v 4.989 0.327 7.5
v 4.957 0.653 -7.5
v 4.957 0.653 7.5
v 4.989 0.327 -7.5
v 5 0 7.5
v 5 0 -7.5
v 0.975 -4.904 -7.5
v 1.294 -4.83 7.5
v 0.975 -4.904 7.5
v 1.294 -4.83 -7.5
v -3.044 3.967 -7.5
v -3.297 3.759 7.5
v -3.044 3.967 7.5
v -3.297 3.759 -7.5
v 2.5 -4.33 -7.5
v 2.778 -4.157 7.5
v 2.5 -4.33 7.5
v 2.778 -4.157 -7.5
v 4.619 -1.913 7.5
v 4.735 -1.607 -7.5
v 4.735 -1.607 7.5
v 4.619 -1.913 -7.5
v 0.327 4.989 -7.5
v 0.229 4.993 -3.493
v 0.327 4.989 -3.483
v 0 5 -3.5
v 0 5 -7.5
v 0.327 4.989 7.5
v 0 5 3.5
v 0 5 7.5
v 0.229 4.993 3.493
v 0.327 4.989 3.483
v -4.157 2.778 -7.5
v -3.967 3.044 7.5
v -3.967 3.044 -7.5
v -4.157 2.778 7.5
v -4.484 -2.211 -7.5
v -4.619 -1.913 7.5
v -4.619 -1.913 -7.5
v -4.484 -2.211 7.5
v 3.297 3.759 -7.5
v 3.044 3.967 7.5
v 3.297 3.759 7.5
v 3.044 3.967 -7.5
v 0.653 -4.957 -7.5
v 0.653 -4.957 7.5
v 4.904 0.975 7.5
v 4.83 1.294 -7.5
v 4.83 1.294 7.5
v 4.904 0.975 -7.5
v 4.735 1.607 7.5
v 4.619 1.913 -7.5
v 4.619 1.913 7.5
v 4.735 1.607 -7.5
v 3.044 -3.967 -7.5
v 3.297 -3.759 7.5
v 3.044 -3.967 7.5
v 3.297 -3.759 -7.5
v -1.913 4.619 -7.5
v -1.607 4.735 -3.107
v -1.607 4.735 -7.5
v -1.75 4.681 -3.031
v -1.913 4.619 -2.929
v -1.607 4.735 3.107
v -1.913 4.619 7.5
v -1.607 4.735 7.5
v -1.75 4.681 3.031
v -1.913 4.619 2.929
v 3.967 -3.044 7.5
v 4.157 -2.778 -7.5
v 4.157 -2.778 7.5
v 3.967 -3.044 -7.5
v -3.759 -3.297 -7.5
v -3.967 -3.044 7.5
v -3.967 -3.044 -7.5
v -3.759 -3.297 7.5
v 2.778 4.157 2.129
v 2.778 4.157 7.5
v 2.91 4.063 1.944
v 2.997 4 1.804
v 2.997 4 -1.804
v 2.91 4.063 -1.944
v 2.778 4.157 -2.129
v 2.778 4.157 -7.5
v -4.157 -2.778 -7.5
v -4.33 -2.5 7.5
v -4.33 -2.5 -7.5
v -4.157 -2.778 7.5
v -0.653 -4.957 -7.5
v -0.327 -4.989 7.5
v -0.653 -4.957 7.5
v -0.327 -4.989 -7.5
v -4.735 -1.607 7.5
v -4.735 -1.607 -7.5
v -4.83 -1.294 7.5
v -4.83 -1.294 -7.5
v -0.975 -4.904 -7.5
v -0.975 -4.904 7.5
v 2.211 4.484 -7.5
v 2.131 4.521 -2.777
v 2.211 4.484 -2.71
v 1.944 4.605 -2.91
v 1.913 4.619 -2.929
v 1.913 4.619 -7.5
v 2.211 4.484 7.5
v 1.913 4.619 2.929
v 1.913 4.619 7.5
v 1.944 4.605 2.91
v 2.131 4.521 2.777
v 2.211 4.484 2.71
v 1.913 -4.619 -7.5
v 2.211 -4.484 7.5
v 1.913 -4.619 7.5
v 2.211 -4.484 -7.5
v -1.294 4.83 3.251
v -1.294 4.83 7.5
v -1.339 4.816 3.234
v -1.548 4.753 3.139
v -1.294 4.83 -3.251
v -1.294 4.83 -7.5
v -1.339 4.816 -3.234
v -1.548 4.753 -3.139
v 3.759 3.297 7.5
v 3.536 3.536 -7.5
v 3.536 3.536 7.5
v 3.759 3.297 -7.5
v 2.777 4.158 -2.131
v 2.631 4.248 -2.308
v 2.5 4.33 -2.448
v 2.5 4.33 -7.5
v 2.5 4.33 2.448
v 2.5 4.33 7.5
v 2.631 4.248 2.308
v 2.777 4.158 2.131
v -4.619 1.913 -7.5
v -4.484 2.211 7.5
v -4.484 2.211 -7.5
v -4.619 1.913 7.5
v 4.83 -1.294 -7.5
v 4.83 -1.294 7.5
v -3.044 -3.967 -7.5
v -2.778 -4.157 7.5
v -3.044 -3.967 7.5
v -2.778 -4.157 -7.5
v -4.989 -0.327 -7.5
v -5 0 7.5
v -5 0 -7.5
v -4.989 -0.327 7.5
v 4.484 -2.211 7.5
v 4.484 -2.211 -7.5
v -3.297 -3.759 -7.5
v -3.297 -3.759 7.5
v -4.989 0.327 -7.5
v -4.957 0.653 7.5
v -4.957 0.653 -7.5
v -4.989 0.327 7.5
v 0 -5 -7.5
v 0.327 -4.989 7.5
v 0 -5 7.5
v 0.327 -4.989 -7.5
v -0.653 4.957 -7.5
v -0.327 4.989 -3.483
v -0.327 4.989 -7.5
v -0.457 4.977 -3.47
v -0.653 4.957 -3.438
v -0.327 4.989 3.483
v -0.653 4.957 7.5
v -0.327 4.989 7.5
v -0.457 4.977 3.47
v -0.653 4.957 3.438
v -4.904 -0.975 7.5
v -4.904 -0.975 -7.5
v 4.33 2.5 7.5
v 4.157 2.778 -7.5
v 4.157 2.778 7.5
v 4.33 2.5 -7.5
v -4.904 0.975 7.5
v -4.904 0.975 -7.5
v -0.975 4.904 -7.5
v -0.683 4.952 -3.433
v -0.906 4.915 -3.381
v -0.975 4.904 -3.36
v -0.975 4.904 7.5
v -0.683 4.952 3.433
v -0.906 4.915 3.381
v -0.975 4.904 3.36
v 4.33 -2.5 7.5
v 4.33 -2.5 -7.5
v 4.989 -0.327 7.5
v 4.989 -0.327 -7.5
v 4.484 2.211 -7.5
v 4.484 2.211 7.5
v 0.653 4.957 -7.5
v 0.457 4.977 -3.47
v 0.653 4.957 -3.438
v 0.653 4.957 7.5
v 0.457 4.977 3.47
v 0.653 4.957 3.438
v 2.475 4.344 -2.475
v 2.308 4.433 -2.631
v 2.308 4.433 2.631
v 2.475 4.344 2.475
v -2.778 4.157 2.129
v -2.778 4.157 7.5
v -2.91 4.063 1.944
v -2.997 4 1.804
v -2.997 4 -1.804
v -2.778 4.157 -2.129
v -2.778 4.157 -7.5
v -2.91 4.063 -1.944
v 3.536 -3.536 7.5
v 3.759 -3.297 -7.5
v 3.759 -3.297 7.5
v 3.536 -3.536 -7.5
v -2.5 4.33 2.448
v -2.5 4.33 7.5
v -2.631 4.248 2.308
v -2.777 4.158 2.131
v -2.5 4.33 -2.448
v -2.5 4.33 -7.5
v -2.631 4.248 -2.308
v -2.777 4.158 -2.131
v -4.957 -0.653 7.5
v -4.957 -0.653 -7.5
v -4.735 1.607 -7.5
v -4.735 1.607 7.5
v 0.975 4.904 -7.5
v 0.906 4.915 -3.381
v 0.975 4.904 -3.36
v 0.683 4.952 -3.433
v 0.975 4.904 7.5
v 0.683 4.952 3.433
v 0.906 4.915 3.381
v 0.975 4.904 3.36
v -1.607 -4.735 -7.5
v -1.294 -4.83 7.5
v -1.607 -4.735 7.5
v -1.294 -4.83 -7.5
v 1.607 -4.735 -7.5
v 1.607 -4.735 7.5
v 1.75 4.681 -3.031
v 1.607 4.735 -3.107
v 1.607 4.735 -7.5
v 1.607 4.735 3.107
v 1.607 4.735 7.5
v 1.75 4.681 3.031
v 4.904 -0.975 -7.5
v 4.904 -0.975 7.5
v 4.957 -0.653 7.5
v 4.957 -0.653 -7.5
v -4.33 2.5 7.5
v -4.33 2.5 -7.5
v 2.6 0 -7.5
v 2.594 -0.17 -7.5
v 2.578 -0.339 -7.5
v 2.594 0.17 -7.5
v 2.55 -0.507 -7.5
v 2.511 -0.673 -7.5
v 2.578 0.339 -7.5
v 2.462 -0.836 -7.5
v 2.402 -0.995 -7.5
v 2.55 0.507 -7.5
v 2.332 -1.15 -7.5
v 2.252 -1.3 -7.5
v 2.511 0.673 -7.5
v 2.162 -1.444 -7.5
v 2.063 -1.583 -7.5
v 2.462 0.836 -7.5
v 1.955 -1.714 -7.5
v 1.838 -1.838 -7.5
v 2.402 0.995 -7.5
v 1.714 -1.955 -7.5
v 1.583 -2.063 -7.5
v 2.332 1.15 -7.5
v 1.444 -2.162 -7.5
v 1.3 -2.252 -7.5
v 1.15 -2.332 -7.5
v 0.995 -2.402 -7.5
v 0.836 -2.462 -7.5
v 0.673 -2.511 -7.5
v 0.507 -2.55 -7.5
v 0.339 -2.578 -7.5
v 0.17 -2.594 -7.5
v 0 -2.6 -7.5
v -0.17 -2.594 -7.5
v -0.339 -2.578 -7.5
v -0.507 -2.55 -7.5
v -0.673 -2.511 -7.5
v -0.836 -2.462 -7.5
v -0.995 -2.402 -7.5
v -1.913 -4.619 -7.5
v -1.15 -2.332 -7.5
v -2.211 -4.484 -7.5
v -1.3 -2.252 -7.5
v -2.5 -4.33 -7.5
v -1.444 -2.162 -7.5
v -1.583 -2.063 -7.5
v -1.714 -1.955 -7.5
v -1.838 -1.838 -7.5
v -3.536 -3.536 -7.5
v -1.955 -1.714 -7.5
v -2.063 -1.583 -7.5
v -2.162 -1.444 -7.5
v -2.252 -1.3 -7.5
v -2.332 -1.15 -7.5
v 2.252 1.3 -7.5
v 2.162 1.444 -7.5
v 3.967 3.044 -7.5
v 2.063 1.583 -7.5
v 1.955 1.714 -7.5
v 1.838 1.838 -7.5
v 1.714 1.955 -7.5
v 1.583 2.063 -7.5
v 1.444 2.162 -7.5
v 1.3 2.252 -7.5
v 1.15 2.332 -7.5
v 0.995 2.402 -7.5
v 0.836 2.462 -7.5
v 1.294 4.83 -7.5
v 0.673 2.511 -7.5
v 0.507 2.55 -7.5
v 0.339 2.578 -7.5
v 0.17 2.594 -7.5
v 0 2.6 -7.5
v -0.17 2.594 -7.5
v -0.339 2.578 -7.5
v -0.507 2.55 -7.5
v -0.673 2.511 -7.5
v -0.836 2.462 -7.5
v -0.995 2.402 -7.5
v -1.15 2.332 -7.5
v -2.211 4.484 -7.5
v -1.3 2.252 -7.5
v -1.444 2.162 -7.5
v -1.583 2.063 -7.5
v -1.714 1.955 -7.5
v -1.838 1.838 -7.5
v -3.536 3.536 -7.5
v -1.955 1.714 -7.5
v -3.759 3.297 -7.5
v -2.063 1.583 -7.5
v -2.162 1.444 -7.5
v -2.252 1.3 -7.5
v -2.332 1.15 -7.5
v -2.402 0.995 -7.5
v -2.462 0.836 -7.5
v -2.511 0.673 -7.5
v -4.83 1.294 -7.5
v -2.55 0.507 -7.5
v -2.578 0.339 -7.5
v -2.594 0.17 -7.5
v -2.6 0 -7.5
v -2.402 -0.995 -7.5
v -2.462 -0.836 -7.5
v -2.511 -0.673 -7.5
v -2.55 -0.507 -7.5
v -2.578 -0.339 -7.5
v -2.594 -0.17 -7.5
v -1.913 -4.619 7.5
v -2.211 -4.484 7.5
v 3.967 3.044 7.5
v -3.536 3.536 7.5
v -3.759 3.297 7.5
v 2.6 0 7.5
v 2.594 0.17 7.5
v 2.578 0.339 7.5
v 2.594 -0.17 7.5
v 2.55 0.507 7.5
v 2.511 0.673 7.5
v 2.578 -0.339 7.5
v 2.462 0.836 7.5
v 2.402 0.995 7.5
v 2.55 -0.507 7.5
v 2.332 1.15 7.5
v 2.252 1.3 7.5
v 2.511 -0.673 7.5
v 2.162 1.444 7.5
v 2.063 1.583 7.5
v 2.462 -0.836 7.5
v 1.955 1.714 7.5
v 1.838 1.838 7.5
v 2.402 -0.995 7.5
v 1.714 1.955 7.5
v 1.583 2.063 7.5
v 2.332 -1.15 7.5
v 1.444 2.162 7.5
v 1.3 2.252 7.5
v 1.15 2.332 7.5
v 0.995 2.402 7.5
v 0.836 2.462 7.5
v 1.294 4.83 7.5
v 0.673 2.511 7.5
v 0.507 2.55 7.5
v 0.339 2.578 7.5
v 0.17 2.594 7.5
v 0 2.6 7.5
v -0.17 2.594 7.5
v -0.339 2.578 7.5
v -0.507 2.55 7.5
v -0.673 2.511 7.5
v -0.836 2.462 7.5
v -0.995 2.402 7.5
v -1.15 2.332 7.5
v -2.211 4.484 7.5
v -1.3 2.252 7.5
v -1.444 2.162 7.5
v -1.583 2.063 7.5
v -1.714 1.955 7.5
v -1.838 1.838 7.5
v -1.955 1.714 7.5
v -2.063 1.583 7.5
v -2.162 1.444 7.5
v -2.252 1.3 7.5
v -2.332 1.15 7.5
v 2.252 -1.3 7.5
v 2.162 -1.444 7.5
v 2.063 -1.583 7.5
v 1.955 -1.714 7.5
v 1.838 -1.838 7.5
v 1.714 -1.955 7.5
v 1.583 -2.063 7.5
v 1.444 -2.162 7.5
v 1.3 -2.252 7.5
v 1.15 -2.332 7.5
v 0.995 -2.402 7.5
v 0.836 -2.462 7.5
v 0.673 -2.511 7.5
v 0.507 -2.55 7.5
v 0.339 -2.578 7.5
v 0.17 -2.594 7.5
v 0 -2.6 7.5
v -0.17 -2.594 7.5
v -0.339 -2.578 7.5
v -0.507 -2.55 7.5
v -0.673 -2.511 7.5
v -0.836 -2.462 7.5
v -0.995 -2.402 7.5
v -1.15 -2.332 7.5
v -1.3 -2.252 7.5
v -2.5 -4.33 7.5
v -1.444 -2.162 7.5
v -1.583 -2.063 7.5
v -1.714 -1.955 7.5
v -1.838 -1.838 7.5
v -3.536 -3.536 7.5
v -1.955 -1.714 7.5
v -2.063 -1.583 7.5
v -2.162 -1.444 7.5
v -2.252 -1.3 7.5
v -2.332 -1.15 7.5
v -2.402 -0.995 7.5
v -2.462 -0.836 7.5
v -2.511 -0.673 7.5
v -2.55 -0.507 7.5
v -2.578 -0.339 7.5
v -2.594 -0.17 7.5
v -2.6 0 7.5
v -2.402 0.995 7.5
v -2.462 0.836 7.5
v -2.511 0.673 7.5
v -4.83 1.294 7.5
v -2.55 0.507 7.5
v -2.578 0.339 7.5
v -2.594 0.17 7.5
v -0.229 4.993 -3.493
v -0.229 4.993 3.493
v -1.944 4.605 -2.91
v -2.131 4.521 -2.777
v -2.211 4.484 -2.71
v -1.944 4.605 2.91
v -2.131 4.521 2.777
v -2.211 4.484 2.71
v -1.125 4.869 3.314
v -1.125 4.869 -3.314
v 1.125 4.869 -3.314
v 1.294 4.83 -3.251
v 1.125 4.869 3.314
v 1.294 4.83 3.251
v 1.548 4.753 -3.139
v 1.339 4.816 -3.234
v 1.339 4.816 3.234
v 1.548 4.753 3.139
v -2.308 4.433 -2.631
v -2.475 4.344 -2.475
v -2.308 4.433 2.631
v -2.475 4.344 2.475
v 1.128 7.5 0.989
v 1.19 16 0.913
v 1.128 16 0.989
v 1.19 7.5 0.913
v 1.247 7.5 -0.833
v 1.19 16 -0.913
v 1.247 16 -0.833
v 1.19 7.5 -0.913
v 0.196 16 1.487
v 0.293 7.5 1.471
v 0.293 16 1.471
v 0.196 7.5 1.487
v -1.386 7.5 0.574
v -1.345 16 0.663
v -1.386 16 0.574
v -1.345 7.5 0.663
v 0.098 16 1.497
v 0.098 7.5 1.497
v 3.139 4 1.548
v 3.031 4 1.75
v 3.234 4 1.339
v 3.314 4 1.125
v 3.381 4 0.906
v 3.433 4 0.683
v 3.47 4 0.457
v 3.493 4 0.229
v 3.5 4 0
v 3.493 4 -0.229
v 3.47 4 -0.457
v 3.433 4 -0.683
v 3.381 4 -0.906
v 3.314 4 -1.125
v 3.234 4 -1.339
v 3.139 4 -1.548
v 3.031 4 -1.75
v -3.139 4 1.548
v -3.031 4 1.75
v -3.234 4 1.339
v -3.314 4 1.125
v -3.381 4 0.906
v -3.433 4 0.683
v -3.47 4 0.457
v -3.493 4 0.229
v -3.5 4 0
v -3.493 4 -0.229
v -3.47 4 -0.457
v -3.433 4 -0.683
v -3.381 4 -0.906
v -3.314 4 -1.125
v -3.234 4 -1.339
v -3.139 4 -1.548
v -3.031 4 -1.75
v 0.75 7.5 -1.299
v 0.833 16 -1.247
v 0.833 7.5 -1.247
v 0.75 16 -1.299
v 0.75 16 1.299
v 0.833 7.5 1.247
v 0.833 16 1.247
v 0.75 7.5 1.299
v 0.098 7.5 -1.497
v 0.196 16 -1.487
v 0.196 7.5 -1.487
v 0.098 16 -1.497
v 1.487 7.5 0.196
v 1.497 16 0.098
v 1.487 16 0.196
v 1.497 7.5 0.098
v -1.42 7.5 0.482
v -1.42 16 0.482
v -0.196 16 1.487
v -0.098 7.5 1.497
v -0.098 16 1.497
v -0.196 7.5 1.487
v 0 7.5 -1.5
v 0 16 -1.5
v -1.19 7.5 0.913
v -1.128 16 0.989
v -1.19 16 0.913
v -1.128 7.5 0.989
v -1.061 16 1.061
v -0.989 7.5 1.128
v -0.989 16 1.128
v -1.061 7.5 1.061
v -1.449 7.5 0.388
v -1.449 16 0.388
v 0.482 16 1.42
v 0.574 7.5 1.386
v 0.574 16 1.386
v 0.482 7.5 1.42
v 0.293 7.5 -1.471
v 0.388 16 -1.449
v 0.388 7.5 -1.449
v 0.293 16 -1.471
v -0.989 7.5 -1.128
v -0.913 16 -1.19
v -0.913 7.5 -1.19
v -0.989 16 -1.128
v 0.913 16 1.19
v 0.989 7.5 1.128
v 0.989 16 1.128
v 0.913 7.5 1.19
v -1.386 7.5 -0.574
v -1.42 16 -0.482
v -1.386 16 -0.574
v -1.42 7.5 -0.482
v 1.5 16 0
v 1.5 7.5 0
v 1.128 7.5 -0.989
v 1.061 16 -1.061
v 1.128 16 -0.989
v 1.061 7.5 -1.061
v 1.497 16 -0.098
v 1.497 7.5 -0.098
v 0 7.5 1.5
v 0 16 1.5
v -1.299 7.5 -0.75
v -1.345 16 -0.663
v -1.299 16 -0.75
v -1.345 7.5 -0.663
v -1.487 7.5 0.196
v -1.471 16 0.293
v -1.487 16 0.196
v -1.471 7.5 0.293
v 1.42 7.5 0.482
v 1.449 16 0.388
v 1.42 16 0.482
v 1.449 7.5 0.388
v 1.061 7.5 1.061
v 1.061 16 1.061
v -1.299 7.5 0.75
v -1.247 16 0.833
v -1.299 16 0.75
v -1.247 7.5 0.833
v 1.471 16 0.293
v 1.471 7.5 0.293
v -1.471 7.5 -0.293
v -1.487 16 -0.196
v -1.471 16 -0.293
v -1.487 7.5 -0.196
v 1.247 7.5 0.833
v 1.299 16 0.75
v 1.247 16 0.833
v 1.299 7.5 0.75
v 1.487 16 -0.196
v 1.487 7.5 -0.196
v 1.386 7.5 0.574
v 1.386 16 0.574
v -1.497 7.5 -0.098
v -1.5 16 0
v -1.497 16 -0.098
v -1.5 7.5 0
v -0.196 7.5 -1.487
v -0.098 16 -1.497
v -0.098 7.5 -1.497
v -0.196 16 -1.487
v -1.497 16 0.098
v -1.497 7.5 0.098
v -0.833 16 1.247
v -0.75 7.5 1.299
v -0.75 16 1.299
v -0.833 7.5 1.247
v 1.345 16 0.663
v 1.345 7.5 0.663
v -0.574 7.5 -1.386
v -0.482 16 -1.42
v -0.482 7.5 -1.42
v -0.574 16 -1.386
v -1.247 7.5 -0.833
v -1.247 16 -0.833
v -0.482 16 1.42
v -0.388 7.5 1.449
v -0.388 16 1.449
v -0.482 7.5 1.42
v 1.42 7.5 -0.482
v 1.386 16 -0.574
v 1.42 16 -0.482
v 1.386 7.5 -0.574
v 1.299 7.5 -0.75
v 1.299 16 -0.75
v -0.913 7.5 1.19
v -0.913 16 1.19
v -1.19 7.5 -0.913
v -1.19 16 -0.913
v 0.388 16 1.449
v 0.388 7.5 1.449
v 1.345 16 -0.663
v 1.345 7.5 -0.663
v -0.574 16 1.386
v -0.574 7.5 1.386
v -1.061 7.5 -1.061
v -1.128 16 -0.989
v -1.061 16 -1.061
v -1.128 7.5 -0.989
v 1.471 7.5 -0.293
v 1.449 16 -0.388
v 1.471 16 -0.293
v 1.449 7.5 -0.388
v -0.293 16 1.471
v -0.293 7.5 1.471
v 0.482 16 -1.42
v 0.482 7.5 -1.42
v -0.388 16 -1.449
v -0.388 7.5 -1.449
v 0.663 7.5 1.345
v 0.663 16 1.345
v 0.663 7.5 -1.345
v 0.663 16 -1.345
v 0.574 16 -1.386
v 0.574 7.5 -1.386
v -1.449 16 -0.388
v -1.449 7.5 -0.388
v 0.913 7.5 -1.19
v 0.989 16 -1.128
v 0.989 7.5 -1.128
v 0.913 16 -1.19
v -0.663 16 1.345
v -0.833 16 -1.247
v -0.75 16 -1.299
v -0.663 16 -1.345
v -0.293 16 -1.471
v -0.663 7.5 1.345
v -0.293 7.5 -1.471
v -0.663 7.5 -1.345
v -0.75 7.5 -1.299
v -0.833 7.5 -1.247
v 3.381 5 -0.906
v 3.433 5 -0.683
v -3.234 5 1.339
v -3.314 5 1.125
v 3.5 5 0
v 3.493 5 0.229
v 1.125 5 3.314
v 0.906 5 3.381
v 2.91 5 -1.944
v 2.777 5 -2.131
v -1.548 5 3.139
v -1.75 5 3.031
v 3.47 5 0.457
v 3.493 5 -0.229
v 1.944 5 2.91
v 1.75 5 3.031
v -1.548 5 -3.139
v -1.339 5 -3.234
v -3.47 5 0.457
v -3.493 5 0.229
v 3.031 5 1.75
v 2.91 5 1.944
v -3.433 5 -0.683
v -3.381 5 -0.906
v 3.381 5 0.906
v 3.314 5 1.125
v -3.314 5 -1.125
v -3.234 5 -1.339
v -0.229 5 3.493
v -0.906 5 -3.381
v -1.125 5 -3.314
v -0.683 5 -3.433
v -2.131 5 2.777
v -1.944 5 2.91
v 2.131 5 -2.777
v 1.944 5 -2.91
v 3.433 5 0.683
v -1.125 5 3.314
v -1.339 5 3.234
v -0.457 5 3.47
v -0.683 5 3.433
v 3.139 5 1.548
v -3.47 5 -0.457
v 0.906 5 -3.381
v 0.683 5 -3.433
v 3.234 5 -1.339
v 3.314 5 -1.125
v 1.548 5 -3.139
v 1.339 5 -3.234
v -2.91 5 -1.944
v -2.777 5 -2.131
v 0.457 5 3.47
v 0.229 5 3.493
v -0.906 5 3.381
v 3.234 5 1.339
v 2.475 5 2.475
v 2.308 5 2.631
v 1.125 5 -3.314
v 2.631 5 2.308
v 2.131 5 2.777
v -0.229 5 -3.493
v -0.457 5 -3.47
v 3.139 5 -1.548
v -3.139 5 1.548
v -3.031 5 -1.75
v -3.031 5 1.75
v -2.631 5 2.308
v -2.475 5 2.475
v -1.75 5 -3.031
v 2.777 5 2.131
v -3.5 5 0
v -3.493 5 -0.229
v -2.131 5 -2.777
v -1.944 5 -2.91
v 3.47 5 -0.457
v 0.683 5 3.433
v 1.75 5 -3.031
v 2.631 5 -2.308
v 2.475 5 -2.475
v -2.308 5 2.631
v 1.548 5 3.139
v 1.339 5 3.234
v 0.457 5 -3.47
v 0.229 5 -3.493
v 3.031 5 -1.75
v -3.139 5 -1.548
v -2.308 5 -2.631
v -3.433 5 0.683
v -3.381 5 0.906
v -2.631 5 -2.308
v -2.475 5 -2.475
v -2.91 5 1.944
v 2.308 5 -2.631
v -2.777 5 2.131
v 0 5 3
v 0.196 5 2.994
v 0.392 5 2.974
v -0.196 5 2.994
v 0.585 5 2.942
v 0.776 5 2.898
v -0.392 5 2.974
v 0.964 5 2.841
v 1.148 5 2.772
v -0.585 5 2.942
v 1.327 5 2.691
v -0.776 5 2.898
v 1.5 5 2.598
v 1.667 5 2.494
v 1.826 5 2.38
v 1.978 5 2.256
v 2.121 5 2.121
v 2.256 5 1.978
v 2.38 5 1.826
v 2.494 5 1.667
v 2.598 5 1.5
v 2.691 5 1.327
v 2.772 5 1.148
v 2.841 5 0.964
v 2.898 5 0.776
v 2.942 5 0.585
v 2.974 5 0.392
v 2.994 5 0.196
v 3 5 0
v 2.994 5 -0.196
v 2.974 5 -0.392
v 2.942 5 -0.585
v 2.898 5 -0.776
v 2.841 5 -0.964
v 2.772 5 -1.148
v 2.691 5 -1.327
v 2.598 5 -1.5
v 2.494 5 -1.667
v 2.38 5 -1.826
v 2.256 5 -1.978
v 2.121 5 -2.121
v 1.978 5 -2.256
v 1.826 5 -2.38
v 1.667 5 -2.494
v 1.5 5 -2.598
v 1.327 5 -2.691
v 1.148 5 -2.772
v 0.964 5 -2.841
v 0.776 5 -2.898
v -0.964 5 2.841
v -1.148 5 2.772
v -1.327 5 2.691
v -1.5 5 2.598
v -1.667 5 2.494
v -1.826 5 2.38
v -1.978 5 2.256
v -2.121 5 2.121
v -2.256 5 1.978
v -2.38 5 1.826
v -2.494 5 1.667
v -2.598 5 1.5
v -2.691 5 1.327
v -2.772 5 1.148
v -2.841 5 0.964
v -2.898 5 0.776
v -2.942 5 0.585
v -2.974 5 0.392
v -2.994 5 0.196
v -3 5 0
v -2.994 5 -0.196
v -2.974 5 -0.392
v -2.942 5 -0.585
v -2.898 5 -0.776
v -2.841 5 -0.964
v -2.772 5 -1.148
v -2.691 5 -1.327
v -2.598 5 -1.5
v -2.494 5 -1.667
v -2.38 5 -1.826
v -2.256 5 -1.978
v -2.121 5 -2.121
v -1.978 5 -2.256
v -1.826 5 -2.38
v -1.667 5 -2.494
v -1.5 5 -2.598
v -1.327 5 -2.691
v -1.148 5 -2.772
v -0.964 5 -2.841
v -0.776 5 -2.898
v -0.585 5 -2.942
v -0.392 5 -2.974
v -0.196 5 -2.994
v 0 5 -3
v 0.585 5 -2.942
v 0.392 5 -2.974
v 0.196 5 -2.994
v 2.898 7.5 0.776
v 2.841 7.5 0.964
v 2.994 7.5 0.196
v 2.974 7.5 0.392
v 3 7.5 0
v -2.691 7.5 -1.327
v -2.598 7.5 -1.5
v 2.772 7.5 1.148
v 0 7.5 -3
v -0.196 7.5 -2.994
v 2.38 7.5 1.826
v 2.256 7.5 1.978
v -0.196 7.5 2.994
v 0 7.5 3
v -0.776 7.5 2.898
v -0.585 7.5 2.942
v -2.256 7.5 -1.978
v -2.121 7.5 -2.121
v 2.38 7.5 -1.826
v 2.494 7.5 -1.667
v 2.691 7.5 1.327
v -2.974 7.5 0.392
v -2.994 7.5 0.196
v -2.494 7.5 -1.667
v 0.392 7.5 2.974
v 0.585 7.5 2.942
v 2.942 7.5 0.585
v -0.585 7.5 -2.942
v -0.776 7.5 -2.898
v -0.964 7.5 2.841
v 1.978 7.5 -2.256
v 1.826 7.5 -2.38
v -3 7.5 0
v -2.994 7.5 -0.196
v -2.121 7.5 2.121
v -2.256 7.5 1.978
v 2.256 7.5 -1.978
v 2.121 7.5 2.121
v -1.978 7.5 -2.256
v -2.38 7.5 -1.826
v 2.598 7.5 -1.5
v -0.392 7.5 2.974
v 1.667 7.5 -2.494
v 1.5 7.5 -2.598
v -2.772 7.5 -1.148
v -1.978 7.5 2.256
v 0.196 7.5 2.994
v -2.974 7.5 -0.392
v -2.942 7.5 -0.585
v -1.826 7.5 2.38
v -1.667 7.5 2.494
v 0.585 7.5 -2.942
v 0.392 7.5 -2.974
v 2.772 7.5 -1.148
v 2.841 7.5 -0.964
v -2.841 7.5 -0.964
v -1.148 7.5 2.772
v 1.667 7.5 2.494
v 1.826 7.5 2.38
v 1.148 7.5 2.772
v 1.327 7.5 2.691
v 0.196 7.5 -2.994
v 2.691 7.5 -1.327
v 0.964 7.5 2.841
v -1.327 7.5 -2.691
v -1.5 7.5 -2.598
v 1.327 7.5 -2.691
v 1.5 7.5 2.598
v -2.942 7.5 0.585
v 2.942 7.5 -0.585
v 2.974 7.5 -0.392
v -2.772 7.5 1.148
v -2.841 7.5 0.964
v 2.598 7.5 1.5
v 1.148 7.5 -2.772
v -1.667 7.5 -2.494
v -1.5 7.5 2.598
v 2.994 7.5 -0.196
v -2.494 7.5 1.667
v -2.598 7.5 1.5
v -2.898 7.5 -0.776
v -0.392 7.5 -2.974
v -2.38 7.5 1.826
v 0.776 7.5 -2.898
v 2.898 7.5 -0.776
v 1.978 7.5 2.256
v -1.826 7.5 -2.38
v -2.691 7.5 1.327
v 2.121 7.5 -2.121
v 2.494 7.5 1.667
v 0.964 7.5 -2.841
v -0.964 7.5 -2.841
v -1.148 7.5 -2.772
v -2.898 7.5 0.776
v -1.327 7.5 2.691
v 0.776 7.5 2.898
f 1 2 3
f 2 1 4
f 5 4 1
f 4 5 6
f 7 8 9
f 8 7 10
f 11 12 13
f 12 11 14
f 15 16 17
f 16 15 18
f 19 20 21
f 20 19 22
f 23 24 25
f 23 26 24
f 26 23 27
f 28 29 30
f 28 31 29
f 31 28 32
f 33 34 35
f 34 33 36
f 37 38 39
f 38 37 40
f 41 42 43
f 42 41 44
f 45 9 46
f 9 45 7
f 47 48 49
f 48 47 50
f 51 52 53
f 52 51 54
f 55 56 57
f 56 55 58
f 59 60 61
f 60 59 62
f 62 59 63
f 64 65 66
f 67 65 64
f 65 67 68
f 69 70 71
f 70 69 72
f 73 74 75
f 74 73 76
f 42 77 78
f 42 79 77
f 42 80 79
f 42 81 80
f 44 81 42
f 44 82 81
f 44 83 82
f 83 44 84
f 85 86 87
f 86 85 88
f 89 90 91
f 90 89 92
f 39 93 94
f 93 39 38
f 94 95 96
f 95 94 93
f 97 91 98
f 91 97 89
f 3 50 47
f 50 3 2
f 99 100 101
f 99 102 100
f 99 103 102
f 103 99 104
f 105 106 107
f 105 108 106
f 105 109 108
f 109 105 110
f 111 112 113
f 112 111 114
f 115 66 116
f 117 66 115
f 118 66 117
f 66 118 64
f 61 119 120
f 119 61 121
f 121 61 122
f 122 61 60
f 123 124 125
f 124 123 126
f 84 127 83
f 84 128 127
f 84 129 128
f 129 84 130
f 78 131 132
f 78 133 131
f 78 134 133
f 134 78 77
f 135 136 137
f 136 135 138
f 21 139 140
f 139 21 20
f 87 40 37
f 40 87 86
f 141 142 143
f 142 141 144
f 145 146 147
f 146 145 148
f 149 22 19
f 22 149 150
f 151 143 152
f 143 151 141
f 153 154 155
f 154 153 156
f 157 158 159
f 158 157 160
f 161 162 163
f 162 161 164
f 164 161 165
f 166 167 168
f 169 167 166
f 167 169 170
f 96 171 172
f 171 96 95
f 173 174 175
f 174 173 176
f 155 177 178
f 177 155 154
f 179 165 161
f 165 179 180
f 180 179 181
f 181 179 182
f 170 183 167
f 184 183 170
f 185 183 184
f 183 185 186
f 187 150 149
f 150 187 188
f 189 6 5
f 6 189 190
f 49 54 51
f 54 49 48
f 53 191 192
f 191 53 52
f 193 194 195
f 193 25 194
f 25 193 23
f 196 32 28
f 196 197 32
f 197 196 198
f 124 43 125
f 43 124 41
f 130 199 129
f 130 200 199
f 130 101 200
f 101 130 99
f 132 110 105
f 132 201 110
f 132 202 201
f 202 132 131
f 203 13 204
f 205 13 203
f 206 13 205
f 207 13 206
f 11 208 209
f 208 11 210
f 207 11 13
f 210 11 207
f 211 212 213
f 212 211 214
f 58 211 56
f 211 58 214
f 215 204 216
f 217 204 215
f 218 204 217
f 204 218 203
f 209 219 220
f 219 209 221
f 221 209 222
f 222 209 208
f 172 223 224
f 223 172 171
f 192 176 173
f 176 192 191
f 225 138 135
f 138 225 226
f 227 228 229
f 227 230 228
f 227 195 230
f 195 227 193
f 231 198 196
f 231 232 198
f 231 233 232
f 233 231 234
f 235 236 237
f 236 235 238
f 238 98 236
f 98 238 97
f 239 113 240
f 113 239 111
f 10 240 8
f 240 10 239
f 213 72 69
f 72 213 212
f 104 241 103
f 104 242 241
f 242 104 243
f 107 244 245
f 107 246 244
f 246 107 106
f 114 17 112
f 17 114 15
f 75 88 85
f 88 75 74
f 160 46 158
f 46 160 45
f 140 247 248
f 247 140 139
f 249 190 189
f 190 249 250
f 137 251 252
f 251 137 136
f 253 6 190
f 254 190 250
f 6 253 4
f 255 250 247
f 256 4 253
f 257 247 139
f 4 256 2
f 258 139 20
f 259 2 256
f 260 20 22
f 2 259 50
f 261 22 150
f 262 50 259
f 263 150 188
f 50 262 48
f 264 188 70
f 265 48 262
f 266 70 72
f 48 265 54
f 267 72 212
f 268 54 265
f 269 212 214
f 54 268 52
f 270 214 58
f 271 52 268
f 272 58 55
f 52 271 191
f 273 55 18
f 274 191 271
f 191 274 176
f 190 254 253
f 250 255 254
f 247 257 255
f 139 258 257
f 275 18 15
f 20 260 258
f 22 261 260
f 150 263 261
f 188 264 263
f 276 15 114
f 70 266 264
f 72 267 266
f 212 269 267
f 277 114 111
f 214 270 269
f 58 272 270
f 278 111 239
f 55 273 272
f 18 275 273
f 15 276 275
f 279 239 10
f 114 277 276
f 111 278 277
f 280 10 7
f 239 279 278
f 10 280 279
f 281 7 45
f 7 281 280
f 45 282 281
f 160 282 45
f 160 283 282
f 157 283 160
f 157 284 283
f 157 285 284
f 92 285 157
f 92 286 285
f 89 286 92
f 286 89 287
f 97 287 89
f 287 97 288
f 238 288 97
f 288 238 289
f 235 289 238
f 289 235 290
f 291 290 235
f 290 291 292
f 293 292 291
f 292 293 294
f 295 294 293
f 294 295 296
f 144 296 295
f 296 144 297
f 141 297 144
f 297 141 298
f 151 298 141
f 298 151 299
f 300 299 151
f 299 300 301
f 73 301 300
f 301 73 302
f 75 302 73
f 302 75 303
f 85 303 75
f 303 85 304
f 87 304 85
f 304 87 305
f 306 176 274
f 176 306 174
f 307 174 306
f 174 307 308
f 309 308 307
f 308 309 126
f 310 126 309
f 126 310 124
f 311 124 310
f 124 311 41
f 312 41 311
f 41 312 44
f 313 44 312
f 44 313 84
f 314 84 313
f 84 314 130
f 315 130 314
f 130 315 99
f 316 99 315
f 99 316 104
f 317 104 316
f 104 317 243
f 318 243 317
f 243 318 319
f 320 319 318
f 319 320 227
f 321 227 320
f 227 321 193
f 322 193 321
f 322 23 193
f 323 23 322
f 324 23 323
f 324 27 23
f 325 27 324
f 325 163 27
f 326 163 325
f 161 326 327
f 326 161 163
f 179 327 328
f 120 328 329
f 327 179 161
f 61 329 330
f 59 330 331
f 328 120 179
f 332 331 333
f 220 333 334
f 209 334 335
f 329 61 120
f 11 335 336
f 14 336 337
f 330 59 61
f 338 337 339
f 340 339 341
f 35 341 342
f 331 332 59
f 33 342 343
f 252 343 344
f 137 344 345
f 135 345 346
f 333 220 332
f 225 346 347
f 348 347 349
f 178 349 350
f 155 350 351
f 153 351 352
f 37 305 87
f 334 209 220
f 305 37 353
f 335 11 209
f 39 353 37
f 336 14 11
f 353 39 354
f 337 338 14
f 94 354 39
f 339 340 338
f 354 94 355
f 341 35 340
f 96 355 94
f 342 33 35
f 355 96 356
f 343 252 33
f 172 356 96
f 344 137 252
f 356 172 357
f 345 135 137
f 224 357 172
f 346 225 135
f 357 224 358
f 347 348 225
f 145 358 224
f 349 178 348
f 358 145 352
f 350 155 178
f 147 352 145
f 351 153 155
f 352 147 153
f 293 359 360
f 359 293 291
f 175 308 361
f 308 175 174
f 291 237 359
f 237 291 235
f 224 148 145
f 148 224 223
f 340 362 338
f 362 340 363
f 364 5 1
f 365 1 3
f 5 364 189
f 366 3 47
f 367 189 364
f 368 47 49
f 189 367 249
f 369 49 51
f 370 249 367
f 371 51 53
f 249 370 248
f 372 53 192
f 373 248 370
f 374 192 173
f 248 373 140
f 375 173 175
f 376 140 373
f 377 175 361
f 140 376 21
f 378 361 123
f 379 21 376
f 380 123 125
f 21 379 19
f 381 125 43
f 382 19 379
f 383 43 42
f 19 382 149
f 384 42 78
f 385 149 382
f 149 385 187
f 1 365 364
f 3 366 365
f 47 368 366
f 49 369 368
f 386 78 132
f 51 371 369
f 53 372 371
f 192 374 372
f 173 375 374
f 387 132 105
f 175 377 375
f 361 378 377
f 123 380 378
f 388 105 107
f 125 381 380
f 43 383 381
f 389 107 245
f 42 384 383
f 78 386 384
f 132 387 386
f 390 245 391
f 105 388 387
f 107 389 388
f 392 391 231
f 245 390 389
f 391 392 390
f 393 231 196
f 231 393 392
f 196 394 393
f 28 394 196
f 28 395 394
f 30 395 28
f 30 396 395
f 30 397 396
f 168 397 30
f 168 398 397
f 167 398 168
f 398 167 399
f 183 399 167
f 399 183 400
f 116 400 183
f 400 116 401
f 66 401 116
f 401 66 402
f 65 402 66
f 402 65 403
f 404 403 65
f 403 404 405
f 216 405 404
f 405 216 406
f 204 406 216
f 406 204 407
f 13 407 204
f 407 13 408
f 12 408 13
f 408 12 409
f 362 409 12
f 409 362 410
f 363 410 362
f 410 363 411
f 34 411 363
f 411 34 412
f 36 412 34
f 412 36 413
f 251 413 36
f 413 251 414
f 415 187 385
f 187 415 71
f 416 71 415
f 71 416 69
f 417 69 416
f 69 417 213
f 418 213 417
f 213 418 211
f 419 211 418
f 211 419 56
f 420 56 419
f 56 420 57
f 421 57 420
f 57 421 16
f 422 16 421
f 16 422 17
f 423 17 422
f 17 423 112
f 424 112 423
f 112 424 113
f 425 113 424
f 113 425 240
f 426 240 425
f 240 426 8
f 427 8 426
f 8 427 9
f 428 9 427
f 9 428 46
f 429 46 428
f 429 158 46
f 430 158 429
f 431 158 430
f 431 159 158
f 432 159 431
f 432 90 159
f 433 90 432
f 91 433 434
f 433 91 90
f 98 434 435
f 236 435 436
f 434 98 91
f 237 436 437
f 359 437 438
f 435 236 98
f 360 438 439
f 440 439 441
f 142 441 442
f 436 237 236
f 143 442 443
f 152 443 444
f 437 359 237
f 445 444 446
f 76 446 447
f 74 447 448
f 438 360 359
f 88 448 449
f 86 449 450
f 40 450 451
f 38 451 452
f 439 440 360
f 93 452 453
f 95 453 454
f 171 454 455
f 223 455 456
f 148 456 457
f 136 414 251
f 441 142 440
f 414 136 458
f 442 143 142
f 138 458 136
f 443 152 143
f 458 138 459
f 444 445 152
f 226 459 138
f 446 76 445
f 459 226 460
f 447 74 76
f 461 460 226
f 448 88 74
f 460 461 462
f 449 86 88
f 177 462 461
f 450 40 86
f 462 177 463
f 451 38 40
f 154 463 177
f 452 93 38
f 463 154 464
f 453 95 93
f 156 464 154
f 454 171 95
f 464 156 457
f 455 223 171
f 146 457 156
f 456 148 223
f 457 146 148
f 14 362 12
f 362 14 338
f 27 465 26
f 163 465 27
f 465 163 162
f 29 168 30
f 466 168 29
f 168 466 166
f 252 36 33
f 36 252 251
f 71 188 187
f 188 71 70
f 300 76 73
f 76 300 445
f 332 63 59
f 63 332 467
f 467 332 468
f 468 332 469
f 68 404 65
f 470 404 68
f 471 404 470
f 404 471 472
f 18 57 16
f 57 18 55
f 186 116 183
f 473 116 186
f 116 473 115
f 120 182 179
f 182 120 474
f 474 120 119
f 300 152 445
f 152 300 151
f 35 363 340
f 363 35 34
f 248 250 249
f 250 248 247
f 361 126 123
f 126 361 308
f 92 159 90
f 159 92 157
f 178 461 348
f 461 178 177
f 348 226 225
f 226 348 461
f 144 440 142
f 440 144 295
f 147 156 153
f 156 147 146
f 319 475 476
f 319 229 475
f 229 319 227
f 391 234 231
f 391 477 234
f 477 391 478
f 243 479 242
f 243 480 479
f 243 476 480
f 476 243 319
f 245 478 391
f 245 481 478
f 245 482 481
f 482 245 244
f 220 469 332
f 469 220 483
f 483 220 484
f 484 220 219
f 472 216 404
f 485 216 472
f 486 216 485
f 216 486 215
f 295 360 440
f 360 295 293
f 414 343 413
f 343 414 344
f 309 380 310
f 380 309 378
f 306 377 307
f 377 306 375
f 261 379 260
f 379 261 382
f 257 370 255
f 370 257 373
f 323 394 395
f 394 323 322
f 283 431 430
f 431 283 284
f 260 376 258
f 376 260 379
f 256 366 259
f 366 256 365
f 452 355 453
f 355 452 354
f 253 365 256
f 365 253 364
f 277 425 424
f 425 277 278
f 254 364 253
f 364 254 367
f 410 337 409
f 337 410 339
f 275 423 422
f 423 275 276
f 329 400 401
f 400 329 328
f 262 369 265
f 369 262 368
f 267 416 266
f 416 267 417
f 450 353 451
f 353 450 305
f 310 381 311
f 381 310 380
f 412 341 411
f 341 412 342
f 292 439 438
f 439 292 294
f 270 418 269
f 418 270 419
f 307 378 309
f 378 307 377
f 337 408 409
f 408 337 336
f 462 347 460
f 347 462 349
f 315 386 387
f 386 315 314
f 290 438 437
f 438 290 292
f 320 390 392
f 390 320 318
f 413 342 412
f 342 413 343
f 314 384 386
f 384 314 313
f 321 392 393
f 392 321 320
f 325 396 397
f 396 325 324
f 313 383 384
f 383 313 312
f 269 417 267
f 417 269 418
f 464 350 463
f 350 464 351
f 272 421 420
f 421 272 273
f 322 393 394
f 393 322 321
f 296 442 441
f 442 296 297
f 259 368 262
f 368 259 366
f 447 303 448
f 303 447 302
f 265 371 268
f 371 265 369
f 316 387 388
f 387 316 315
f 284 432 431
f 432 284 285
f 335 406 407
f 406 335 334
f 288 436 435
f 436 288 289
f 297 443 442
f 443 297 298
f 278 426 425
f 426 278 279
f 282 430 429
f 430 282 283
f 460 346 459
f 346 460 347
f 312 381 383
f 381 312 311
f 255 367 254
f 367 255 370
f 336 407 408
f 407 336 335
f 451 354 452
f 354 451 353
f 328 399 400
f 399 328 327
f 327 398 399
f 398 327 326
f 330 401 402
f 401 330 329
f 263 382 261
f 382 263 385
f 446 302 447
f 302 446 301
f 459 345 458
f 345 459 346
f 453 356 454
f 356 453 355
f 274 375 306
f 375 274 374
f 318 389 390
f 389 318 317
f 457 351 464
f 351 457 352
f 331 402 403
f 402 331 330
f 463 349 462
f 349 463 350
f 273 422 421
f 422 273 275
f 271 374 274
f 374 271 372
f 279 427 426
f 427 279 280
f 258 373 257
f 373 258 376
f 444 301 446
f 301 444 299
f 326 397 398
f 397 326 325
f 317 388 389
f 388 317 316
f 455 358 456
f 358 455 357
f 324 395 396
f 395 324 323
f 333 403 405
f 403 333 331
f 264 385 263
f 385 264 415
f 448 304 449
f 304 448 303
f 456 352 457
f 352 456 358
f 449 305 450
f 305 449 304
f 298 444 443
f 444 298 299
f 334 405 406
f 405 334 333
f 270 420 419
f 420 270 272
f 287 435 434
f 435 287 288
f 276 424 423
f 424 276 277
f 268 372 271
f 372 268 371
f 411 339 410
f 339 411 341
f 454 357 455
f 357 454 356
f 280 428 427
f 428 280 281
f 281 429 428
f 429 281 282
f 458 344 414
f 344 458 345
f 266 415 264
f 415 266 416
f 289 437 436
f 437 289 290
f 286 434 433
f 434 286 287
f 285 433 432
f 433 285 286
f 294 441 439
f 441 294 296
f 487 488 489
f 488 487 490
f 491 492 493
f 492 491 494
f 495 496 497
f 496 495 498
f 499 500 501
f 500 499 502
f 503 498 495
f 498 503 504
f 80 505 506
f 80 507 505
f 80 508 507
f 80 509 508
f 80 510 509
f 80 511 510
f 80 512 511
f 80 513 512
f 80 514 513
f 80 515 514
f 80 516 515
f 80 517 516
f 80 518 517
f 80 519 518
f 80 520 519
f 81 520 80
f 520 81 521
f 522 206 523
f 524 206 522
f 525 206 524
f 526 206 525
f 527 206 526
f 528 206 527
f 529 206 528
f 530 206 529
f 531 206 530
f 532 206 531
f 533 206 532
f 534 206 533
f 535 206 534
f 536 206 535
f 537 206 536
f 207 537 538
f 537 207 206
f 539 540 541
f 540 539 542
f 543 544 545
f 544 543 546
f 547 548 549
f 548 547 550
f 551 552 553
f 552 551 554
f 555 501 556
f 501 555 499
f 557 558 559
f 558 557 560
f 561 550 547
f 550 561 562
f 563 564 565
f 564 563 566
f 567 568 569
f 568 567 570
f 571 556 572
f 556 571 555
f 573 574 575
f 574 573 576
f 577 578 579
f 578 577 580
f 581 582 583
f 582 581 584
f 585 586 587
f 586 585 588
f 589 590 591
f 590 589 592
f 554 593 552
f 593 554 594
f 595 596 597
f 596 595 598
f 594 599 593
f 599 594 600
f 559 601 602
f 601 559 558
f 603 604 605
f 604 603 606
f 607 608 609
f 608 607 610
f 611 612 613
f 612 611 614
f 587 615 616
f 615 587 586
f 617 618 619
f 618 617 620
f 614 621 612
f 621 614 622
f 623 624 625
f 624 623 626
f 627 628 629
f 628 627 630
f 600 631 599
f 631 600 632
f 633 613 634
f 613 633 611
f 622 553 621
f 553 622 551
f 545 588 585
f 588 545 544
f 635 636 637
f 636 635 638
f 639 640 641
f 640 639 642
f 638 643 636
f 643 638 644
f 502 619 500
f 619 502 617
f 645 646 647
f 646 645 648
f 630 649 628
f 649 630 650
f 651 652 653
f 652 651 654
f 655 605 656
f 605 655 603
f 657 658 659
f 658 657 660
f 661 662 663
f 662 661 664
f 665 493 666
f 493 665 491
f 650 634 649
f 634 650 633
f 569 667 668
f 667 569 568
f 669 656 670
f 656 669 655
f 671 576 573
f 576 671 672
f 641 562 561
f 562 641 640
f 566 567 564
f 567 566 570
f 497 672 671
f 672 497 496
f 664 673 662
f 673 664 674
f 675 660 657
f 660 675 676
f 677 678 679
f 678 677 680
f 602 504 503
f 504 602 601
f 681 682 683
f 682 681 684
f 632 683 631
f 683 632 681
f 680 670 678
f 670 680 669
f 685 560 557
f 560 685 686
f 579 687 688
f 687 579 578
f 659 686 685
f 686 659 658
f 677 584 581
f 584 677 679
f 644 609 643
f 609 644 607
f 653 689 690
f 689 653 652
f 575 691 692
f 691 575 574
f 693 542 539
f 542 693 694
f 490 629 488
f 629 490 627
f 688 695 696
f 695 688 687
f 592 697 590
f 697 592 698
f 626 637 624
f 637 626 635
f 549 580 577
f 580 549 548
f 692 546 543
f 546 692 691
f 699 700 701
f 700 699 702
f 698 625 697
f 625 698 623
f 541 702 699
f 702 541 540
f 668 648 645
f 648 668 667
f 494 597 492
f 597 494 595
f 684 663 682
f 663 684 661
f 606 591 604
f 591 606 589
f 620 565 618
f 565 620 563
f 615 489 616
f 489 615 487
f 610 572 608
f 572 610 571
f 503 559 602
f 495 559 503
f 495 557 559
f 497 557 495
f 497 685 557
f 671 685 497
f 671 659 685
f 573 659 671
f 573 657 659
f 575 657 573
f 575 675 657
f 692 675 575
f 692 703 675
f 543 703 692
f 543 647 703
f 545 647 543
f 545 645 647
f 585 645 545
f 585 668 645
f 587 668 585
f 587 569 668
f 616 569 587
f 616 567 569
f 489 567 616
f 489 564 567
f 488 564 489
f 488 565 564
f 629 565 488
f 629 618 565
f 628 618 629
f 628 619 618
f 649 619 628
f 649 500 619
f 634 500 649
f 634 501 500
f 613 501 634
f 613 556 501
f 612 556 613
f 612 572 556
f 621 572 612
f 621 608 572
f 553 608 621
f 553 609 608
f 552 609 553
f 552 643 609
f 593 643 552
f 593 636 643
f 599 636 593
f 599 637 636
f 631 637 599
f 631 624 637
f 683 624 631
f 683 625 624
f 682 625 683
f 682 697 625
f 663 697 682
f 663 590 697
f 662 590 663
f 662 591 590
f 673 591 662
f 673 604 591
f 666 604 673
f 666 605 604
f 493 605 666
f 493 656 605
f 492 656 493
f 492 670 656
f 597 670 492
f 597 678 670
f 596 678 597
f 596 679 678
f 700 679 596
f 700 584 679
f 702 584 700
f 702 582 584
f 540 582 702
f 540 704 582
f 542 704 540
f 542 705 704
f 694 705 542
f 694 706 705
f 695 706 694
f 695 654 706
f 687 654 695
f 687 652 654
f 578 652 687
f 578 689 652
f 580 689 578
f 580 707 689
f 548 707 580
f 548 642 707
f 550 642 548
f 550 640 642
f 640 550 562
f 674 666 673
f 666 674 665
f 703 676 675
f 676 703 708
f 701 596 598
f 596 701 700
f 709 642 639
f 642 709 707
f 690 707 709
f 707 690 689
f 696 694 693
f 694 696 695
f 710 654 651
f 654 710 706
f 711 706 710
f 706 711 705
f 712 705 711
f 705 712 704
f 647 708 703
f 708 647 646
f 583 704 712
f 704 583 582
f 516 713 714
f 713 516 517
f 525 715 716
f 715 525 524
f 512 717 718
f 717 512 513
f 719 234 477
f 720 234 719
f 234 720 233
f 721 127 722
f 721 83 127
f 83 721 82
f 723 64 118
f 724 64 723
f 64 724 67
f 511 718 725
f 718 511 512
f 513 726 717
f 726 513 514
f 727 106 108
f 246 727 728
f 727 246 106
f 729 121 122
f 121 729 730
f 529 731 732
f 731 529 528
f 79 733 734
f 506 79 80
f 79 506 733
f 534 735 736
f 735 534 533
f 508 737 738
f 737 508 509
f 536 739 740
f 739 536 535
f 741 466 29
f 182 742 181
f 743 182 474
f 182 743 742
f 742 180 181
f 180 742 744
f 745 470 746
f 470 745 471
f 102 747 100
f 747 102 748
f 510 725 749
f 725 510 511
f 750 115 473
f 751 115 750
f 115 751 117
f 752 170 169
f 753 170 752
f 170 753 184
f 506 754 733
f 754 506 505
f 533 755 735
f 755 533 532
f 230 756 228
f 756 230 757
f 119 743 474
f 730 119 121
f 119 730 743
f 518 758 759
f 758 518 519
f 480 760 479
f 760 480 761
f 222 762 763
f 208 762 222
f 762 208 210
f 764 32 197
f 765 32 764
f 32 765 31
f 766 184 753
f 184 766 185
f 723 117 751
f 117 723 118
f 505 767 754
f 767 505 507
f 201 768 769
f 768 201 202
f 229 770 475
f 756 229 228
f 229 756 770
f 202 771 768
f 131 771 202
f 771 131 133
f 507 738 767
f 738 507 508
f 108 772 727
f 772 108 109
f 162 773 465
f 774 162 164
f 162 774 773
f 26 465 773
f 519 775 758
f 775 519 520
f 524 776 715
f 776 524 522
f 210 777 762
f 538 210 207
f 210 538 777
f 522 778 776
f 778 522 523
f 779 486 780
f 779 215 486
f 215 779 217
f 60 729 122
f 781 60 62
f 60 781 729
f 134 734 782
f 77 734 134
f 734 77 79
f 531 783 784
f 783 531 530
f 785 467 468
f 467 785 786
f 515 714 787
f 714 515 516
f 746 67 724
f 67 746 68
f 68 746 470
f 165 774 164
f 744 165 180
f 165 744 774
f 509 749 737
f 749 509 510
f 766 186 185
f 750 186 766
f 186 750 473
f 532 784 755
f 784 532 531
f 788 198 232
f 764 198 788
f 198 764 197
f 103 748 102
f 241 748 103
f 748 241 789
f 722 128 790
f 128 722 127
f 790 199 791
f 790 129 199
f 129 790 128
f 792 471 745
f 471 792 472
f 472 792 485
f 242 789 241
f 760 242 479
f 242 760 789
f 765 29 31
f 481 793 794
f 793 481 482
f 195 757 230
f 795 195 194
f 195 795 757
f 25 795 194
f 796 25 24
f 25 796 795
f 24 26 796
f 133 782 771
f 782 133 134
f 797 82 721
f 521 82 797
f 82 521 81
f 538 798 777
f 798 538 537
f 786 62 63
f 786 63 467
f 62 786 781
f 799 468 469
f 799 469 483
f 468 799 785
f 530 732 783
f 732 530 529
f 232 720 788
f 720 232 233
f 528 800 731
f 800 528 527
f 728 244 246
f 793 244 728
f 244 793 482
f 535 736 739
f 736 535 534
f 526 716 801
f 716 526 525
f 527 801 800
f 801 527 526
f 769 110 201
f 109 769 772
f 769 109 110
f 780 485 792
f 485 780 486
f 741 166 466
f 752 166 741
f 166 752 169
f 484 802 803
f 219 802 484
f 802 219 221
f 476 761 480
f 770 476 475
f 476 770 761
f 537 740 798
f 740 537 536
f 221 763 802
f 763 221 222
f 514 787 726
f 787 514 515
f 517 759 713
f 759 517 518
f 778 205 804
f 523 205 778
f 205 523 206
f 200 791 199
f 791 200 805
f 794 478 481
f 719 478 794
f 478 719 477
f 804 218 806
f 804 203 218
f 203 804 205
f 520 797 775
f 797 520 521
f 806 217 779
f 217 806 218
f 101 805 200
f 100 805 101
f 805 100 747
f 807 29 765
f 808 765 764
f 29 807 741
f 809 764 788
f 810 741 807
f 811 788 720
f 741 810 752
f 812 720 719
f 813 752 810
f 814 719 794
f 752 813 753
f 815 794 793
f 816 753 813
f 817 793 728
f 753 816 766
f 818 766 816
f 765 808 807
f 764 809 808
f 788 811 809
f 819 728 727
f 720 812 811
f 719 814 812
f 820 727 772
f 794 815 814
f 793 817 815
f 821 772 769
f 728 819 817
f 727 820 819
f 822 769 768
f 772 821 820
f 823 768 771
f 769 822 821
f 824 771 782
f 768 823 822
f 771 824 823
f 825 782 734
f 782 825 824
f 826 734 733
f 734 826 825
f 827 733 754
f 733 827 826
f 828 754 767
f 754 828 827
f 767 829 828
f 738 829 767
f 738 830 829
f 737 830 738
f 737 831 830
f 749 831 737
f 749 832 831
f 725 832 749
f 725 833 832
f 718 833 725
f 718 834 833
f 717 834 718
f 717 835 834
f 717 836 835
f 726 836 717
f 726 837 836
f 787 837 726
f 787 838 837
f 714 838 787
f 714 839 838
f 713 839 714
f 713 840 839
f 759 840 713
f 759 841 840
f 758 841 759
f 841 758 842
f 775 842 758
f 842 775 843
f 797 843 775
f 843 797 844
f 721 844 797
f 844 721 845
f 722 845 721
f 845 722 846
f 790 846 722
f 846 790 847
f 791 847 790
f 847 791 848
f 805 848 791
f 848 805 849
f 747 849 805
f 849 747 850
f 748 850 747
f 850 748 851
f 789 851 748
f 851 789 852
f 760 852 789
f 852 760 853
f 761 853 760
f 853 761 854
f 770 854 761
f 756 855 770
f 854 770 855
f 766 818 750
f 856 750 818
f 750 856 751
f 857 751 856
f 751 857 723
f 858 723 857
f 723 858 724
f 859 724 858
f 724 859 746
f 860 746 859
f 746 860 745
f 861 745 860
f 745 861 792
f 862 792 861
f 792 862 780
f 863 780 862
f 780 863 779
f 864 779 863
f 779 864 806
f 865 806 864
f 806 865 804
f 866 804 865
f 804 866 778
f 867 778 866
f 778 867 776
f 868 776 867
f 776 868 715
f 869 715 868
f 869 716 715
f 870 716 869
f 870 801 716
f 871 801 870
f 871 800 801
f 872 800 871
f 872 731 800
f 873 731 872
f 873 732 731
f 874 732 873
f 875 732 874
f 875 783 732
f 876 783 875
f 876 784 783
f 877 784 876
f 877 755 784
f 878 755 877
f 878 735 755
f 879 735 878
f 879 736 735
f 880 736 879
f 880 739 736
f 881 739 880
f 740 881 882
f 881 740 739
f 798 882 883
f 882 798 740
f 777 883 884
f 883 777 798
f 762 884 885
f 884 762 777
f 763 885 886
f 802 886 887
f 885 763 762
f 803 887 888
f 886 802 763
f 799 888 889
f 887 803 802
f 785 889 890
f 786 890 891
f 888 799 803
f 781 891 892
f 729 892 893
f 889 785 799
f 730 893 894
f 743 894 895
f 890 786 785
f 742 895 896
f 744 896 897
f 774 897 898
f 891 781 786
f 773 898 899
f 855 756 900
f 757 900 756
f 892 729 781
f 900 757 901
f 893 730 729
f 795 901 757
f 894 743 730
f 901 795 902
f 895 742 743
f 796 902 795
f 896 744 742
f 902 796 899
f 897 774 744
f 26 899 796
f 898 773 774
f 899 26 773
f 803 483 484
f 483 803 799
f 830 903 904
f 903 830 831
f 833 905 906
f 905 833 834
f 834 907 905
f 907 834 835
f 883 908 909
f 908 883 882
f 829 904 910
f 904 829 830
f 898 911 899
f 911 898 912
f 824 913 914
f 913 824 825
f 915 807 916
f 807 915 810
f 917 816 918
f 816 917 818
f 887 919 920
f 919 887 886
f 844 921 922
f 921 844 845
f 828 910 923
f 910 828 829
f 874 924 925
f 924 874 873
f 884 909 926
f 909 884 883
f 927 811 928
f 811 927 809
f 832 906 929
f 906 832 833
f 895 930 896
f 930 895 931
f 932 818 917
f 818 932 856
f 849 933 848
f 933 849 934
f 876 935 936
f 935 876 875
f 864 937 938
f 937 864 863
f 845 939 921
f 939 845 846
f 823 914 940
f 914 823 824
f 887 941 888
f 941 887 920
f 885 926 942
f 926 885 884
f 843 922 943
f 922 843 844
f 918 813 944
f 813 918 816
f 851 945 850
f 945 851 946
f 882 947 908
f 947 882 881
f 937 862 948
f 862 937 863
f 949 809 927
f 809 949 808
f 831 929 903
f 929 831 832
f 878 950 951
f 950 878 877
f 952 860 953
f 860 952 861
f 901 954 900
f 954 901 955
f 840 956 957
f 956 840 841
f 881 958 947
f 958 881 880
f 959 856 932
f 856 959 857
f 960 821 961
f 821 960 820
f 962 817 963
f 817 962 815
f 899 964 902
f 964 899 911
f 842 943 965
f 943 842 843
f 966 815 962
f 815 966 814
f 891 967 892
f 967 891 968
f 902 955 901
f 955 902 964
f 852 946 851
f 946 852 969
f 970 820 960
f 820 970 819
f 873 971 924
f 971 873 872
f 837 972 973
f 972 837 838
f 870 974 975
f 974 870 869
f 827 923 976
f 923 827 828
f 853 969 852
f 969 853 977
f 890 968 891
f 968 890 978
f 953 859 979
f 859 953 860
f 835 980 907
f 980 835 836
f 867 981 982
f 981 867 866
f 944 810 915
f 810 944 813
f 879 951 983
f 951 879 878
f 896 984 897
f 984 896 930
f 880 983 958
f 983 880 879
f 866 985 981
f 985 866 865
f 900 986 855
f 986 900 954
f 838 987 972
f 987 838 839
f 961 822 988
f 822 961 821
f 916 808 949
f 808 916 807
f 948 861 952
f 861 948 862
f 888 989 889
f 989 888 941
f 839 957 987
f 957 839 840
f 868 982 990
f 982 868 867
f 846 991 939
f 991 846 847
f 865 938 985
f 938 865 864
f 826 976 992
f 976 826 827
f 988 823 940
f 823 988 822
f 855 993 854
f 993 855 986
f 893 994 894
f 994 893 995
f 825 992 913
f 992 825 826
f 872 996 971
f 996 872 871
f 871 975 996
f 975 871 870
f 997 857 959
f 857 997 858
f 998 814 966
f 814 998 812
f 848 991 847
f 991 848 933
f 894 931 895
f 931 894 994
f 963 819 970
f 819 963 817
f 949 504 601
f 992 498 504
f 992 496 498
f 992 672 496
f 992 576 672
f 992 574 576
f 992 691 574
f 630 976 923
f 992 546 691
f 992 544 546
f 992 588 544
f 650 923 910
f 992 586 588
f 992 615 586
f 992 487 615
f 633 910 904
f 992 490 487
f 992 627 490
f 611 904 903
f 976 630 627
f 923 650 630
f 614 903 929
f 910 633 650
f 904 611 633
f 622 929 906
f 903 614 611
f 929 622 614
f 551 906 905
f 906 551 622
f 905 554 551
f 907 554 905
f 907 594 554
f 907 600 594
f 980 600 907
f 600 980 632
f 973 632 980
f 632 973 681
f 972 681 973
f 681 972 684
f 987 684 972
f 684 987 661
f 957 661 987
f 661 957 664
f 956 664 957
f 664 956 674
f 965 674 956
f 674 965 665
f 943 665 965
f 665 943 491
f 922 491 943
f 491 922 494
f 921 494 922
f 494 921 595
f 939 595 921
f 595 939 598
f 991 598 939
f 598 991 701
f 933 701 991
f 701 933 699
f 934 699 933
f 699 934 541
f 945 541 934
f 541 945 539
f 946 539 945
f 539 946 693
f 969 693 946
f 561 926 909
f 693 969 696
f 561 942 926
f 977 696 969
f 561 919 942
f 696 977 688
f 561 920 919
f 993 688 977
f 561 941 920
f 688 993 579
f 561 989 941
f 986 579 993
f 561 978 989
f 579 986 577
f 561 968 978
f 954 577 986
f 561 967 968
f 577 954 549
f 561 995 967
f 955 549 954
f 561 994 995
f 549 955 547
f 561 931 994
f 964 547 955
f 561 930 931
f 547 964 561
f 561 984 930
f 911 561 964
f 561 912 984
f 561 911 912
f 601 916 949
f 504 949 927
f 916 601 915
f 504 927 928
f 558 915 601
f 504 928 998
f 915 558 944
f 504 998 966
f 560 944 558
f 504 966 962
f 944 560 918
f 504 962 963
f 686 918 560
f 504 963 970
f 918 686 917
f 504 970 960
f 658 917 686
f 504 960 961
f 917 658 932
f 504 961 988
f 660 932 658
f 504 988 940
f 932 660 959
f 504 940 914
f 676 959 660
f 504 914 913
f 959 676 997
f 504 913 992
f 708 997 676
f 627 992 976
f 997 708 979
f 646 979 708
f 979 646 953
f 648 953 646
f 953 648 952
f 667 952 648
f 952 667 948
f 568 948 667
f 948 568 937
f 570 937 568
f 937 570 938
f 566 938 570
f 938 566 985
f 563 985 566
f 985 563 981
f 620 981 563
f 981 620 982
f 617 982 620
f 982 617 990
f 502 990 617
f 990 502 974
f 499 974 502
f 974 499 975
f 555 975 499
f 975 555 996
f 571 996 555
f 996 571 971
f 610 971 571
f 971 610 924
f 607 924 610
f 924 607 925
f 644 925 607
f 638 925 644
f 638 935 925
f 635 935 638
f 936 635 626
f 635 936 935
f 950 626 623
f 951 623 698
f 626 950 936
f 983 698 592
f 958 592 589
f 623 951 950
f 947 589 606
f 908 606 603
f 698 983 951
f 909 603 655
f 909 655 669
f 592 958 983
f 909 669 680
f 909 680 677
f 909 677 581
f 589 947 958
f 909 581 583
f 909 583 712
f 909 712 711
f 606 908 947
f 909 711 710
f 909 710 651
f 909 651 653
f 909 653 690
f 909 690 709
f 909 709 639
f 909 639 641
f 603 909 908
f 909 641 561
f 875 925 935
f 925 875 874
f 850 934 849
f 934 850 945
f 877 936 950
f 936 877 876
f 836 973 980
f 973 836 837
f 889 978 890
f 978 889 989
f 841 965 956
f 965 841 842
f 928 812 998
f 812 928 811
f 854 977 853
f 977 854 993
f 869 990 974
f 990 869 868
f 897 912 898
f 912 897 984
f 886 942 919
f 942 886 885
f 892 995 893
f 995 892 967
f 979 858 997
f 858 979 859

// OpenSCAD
// Parameters
bore_diameter_mm = 5; //[2.5:10:0.1]
outer_diameter_mm = 10; //[5:20:0.1]
length_mm = 15; //[7.5:30:0.1]
outer_radius_mm = outer_diameter_mm/2; //[2.5:10:0.1]
bore_radius_mm = bore_diameter_mm/2; //[1.25:5:0.1]
fit_clearance_mm = 0.1; //[0:0.5:0.01]
connect_overlap_mm = 1; //[0.5:2:0.1]
screw_shank_diameter_mm = 3; //[1.5:6:0.1]
screw_length_mm = 12; //[6:24:0.1]
screw_head_diameter_mm = 6; //[3:12:0.1]
screw_head_height_mm = 2.5; //[1.25:5:0.1]
washer_outer_diameter_mm = 7; //[3.5:14:0.1]
washer_thickness_mm = 1; //[0.5:2:0.1]

$fn = 96;

// Linear Bearing - complete geometry (present + used in final union)
module linear_bearing() {
  // Keep as a solid body with a bore (difference), centered at origin
  difference() {
    cylinder(r=outer_radius_mm, h=length_mm, center=true);
    cylinder(r=bore_radius_mm + fit_clearance_mm,
             h=length_mm + 2*connect_overlap_mm, center=true);
  }
}

// Screw and Washer - positioned to physically intersect the bearing OD by connect_overlap_mm
module screw_and_washer() {
  // Axis of screw is along Y (after rotate), so we place its center in Y so it overlaps the bearing.
  // Bearing outer surface is at y = outer_radius_mm.
  // For a cylinder of length L centered at y0, its near end is at y0 - L/2.
  // Set near end to be inside bearing by connect_overlap_mm: y0 - L/2 = outer_radius_mm - connect_overlap_mm
  // => y0 = outer_radius_mm - connect_overlap_mm + L/2
  y_shank_center = outer_radius_mm - connect_overlap_mm + screw_length_mm/2;

  // Washer and head are short cylinders along Y; place them so they also overlap the bearing by connect_overlap_mm.
  y_washer_center = outer_radius_mm - connect_overlap_mm + washer_thickness_mm/2;
  y_head_center   = outer_radius_mm - connect_overlap_mm + washer_thickness_mm + screw_head_height_mm/2;

  union() {
    // Screw shank
    translate([0, y_shank_center, 0])
      rotate([90, 0, 0])
      cylinder(r=screw_shank_diameter_mm/2, h=screw_length_mm, center=true);

    // Washer
    translate([0, y_washer_center, 0])
      rotate([90, 0, 0])
      cylinder(r=washer_outer_diameter_mm/2, h=washer_thickness_mm, center=true);

    // Screw head
    translate([0, y_head_center, 0])
      rotate([90, 0, 0])
      cylinder(r=screw_head_diameter_mm/2, h=screw_head_height_mm, center=true);
  }
}

// Assembly - single connected solid via union(), with guaranteed overlap
module assembly() {
  union() {
    // Linear bearing (missing part fixed by ensuring it is included in the final union)
    color("Silver") linear_bearing();

    // Stepped shaft/post (screw + washer + head) attached with 1mm overlap into bearing OD
    color("DimGray") screw_and_washer();
  }
}

assembly();
